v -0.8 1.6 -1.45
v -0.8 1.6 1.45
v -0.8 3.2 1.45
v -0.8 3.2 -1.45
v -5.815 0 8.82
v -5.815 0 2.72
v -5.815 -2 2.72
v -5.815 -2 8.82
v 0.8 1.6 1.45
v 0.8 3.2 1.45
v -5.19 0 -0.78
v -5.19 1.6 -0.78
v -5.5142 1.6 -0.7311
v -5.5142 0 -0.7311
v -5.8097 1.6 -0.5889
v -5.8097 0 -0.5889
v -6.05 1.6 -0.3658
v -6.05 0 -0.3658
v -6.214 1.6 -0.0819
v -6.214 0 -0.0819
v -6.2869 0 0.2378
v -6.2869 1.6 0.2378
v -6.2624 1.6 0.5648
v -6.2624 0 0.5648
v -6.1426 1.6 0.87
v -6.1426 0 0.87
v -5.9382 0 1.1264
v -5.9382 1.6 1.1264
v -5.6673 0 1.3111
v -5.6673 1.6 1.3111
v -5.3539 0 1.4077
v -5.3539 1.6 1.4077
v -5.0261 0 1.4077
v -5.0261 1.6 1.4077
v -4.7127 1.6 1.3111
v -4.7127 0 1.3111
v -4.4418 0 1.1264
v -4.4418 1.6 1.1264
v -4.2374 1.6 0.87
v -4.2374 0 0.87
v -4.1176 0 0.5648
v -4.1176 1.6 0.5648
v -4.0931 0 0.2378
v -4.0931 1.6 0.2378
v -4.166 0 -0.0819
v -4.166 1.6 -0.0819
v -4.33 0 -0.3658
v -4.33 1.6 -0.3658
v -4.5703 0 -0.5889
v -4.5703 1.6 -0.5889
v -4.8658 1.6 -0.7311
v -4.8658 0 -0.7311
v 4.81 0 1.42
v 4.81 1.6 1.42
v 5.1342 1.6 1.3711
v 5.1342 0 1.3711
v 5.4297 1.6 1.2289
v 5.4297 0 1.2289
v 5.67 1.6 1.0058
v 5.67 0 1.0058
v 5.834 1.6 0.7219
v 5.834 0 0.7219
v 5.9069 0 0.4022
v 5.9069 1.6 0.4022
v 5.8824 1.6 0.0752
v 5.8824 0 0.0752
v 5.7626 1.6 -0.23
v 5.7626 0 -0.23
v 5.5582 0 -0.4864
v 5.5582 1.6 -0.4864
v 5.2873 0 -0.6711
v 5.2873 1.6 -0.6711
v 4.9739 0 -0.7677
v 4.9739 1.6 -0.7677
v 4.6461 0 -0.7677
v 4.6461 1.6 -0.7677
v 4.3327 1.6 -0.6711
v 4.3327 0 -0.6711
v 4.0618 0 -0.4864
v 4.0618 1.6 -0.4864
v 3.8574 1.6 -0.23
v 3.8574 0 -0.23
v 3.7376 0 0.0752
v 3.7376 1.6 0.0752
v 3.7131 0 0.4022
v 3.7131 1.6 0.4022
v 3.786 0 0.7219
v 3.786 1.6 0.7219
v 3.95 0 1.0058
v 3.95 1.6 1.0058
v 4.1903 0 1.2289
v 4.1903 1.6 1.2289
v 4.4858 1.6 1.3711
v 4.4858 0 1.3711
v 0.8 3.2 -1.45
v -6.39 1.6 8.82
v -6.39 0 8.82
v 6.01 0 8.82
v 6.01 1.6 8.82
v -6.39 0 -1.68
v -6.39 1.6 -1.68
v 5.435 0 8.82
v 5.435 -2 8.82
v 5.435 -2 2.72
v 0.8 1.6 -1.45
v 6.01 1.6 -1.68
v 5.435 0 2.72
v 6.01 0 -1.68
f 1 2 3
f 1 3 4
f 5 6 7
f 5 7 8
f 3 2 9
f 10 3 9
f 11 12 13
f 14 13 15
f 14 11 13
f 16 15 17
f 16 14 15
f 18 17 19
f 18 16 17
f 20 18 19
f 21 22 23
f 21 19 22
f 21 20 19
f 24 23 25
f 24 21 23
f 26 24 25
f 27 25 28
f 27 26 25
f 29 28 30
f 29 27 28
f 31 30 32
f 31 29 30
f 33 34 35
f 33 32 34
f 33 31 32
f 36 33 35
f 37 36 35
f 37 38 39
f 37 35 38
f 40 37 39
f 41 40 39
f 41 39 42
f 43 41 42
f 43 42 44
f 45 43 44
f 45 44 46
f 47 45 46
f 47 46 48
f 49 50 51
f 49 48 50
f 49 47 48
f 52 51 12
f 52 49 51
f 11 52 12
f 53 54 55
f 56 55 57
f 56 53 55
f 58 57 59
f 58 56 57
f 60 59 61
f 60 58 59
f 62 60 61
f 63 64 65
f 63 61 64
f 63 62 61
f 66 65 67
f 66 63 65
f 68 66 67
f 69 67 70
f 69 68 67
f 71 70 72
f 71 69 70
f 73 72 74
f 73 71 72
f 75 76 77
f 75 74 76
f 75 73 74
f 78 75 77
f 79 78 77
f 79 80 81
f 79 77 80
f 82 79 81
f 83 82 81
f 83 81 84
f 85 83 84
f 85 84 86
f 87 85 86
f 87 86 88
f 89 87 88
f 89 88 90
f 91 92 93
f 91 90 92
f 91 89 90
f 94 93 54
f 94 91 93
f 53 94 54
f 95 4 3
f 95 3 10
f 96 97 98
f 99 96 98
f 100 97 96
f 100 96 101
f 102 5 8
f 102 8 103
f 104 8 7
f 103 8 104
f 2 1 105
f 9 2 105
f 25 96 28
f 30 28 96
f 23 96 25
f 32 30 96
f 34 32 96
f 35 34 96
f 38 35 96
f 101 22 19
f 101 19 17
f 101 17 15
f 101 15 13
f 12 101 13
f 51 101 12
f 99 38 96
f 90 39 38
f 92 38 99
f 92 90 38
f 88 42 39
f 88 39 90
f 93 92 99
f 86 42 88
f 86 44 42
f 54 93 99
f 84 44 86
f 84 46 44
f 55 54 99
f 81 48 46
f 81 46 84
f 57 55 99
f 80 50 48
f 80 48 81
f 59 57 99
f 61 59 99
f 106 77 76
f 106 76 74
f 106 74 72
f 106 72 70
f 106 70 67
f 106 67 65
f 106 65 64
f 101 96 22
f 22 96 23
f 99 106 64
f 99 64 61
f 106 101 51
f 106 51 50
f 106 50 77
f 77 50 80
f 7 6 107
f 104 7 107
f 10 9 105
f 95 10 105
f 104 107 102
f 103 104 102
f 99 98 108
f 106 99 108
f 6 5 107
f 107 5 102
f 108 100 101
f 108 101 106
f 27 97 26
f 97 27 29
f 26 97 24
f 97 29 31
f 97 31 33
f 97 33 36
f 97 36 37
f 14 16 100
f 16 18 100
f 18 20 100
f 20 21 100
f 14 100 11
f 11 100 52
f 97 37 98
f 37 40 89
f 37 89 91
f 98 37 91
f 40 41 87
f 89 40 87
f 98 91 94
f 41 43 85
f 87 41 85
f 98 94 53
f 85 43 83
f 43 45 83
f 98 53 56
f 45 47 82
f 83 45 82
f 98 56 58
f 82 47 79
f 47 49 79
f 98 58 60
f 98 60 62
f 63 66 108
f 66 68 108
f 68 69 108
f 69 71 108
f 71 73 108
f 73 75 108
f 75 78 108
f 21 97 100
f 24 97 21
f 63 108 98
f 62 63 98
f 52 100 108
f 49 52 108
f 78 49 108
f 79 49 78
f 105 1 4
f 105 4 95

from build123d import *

# Parameters (mm, degrees)
SKETCH1_W           = 12.4
SKETCH1_H           = 10.5
BOSS_EXTRUDE1_DEPTH = 1.6
SKETCH2_R           = 1.1
CUT_EXTRUDE1_DEPTH  = 12.008383169
SKETCH3_W           = 1.6
SKETCH3_H           = 2.9
BOSS_EXTRUDE2_DEPTH = 1.6
SKETCH4_W           = 11.25
SKETCH4_H           = 6.1
BOSS_EXTRUDE3_DEPTH = 2


with BuildPart() as part:
    # Sketch1 → Boss-Extrude1 (new body)
    with BuildSketch(Plane(origin=(0, 0, 0), x_dir=(1, 0, 0), z_dir=(0, 1, 0))):
        with Locations((-0.19, -3.57)):
            Rectangle(SKETCH1_W, SKETCH1_H)
    extrude(amount=BOSS_EXTRUDE1_DEPTH)

    # Sketch2 → Cut-Extrude1 (cut, through all)
    with BuildSketch(Plane(origin=(0, 0, 0), x_dir=(1, 0, 0), z_dir=(0, 1, 0))):
        with Locations((4.81, -0.32)):
            Circle(SKETCH2_R)
        with Locations((-5.19, -0.32)):
            Circle(SKETCH2_R)
    extrude(amount=CUT_EXTRUDE1_DEPTH, mode=Mode.SUBTRACT)


with BuildPart() as body_2:
    # Sketch3 → Boss-Extrude2 (new body)
    with BuildSketch(Plane(origin=(0, 1.6, 0), x_dir=(1, 0, 0), z_dir=(0, 1, 0))):
        Rectangle(SKETCH3_W, SKETCH3_H)
    extrude(amount=BOSS_EXTRUDE2_DEPTH)


with BuildPart() as body_3:
    # Sketch4 → Boss-Extrude3 (new body)
    with BuildSketch(Plane.XZ):
        with Locations((-0.19, 5.77)):
            Rectangle(SKETCH4_W, SKETCH4_H)
    extrude(amount=BOSS_EXTRUDE3_DEPTH)


solid = Compound([part.part, body_2.part, body_3.part])
